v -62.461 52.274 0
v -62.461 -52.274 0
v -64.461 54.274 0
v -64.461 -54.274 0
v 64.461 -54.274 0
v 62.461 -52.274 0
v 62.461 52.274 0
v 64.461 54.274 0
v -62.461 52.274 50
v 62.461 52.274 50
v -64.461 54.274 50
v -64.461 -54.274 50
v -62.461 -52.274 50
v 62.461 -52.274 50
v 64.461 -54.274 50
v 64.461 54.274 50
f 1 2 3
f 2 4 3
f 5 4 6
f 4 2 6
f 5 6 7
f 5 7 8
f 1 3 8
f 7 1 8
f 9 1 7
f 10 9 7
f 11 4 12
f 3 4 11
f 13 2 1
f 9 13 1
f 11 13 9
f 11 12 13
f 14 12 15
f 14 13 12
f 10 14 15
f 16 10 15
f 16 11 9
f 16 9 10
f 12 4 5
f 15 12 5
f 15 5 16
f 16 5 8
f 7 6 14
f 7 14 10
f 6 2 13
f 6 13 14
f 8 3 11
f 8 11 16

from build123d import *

# Parameters (mm, degrees)
SKETCH1_W             = 128.922622712
SKETCH1_H             = 108.547542538
SKETCH1_W_2           = 124.922622712
SKETCH1_H_2           = 104.547542538
BOSS_EXTRUDE1_DEPTH   = 50
SKETCH2_R             = 48.496570744
BOSS_EXTRUDE2_DEPTH   = 50
SKETCH3_R             = 6.994110628
BOSS_EXTRUDE3_DEPTH   = 20
SKETCH3_R_2           = 6.120691225
BOSS_EXTRUDE3_2_DEPTH = 20


with BuildPart() as part:
    # Sketch1 → Boss-Extrude1 (new body)
    with BuildSketch(Plane.XY):
        Rectangle(SKETCH1_W, SKETCH1_H)
        Rectangle(SKETCH1_W_2, SKETCH1_H_2, mode=Mode.SUBTRACT)
    extrude(amount=BOSS_EXTRUDE1_DEPTH)


with BuildPart() as body_2:
    # Sketch2 → Boss-Extrude2 (new body)
    with BuildSketch(Plane.XY):
        with Locations(Location((0, 0, 0), (0, 0, 180))):
            Circle(SKETCH2_R)
    extrude(amount=BOSS_EXTRUDE2_DEPTH)


with BuildPart() as body_3:
    # Sketch3 → Boss-Extrude3 (new body)
    with BuildSketch(Plane.XY):
        with Locations((-51.126362865, 41.516845757)):
            Circle(SKETCH3_R)
    extrude(amount=BOSS_EXTRUDE3_DEPTH)


with BuildPart() as body_4:
    # Sketch3 → Boss-Extrude3 2 (new body)
    with BuildSketch(Plane.XY):
        with Locations((46.461548735, 43.755956539)):
            Circle(SKETCH3_R_2)
    extrude(amount=BOSS_EXTRUDE3_2_DEPTH)


solid = part.part
